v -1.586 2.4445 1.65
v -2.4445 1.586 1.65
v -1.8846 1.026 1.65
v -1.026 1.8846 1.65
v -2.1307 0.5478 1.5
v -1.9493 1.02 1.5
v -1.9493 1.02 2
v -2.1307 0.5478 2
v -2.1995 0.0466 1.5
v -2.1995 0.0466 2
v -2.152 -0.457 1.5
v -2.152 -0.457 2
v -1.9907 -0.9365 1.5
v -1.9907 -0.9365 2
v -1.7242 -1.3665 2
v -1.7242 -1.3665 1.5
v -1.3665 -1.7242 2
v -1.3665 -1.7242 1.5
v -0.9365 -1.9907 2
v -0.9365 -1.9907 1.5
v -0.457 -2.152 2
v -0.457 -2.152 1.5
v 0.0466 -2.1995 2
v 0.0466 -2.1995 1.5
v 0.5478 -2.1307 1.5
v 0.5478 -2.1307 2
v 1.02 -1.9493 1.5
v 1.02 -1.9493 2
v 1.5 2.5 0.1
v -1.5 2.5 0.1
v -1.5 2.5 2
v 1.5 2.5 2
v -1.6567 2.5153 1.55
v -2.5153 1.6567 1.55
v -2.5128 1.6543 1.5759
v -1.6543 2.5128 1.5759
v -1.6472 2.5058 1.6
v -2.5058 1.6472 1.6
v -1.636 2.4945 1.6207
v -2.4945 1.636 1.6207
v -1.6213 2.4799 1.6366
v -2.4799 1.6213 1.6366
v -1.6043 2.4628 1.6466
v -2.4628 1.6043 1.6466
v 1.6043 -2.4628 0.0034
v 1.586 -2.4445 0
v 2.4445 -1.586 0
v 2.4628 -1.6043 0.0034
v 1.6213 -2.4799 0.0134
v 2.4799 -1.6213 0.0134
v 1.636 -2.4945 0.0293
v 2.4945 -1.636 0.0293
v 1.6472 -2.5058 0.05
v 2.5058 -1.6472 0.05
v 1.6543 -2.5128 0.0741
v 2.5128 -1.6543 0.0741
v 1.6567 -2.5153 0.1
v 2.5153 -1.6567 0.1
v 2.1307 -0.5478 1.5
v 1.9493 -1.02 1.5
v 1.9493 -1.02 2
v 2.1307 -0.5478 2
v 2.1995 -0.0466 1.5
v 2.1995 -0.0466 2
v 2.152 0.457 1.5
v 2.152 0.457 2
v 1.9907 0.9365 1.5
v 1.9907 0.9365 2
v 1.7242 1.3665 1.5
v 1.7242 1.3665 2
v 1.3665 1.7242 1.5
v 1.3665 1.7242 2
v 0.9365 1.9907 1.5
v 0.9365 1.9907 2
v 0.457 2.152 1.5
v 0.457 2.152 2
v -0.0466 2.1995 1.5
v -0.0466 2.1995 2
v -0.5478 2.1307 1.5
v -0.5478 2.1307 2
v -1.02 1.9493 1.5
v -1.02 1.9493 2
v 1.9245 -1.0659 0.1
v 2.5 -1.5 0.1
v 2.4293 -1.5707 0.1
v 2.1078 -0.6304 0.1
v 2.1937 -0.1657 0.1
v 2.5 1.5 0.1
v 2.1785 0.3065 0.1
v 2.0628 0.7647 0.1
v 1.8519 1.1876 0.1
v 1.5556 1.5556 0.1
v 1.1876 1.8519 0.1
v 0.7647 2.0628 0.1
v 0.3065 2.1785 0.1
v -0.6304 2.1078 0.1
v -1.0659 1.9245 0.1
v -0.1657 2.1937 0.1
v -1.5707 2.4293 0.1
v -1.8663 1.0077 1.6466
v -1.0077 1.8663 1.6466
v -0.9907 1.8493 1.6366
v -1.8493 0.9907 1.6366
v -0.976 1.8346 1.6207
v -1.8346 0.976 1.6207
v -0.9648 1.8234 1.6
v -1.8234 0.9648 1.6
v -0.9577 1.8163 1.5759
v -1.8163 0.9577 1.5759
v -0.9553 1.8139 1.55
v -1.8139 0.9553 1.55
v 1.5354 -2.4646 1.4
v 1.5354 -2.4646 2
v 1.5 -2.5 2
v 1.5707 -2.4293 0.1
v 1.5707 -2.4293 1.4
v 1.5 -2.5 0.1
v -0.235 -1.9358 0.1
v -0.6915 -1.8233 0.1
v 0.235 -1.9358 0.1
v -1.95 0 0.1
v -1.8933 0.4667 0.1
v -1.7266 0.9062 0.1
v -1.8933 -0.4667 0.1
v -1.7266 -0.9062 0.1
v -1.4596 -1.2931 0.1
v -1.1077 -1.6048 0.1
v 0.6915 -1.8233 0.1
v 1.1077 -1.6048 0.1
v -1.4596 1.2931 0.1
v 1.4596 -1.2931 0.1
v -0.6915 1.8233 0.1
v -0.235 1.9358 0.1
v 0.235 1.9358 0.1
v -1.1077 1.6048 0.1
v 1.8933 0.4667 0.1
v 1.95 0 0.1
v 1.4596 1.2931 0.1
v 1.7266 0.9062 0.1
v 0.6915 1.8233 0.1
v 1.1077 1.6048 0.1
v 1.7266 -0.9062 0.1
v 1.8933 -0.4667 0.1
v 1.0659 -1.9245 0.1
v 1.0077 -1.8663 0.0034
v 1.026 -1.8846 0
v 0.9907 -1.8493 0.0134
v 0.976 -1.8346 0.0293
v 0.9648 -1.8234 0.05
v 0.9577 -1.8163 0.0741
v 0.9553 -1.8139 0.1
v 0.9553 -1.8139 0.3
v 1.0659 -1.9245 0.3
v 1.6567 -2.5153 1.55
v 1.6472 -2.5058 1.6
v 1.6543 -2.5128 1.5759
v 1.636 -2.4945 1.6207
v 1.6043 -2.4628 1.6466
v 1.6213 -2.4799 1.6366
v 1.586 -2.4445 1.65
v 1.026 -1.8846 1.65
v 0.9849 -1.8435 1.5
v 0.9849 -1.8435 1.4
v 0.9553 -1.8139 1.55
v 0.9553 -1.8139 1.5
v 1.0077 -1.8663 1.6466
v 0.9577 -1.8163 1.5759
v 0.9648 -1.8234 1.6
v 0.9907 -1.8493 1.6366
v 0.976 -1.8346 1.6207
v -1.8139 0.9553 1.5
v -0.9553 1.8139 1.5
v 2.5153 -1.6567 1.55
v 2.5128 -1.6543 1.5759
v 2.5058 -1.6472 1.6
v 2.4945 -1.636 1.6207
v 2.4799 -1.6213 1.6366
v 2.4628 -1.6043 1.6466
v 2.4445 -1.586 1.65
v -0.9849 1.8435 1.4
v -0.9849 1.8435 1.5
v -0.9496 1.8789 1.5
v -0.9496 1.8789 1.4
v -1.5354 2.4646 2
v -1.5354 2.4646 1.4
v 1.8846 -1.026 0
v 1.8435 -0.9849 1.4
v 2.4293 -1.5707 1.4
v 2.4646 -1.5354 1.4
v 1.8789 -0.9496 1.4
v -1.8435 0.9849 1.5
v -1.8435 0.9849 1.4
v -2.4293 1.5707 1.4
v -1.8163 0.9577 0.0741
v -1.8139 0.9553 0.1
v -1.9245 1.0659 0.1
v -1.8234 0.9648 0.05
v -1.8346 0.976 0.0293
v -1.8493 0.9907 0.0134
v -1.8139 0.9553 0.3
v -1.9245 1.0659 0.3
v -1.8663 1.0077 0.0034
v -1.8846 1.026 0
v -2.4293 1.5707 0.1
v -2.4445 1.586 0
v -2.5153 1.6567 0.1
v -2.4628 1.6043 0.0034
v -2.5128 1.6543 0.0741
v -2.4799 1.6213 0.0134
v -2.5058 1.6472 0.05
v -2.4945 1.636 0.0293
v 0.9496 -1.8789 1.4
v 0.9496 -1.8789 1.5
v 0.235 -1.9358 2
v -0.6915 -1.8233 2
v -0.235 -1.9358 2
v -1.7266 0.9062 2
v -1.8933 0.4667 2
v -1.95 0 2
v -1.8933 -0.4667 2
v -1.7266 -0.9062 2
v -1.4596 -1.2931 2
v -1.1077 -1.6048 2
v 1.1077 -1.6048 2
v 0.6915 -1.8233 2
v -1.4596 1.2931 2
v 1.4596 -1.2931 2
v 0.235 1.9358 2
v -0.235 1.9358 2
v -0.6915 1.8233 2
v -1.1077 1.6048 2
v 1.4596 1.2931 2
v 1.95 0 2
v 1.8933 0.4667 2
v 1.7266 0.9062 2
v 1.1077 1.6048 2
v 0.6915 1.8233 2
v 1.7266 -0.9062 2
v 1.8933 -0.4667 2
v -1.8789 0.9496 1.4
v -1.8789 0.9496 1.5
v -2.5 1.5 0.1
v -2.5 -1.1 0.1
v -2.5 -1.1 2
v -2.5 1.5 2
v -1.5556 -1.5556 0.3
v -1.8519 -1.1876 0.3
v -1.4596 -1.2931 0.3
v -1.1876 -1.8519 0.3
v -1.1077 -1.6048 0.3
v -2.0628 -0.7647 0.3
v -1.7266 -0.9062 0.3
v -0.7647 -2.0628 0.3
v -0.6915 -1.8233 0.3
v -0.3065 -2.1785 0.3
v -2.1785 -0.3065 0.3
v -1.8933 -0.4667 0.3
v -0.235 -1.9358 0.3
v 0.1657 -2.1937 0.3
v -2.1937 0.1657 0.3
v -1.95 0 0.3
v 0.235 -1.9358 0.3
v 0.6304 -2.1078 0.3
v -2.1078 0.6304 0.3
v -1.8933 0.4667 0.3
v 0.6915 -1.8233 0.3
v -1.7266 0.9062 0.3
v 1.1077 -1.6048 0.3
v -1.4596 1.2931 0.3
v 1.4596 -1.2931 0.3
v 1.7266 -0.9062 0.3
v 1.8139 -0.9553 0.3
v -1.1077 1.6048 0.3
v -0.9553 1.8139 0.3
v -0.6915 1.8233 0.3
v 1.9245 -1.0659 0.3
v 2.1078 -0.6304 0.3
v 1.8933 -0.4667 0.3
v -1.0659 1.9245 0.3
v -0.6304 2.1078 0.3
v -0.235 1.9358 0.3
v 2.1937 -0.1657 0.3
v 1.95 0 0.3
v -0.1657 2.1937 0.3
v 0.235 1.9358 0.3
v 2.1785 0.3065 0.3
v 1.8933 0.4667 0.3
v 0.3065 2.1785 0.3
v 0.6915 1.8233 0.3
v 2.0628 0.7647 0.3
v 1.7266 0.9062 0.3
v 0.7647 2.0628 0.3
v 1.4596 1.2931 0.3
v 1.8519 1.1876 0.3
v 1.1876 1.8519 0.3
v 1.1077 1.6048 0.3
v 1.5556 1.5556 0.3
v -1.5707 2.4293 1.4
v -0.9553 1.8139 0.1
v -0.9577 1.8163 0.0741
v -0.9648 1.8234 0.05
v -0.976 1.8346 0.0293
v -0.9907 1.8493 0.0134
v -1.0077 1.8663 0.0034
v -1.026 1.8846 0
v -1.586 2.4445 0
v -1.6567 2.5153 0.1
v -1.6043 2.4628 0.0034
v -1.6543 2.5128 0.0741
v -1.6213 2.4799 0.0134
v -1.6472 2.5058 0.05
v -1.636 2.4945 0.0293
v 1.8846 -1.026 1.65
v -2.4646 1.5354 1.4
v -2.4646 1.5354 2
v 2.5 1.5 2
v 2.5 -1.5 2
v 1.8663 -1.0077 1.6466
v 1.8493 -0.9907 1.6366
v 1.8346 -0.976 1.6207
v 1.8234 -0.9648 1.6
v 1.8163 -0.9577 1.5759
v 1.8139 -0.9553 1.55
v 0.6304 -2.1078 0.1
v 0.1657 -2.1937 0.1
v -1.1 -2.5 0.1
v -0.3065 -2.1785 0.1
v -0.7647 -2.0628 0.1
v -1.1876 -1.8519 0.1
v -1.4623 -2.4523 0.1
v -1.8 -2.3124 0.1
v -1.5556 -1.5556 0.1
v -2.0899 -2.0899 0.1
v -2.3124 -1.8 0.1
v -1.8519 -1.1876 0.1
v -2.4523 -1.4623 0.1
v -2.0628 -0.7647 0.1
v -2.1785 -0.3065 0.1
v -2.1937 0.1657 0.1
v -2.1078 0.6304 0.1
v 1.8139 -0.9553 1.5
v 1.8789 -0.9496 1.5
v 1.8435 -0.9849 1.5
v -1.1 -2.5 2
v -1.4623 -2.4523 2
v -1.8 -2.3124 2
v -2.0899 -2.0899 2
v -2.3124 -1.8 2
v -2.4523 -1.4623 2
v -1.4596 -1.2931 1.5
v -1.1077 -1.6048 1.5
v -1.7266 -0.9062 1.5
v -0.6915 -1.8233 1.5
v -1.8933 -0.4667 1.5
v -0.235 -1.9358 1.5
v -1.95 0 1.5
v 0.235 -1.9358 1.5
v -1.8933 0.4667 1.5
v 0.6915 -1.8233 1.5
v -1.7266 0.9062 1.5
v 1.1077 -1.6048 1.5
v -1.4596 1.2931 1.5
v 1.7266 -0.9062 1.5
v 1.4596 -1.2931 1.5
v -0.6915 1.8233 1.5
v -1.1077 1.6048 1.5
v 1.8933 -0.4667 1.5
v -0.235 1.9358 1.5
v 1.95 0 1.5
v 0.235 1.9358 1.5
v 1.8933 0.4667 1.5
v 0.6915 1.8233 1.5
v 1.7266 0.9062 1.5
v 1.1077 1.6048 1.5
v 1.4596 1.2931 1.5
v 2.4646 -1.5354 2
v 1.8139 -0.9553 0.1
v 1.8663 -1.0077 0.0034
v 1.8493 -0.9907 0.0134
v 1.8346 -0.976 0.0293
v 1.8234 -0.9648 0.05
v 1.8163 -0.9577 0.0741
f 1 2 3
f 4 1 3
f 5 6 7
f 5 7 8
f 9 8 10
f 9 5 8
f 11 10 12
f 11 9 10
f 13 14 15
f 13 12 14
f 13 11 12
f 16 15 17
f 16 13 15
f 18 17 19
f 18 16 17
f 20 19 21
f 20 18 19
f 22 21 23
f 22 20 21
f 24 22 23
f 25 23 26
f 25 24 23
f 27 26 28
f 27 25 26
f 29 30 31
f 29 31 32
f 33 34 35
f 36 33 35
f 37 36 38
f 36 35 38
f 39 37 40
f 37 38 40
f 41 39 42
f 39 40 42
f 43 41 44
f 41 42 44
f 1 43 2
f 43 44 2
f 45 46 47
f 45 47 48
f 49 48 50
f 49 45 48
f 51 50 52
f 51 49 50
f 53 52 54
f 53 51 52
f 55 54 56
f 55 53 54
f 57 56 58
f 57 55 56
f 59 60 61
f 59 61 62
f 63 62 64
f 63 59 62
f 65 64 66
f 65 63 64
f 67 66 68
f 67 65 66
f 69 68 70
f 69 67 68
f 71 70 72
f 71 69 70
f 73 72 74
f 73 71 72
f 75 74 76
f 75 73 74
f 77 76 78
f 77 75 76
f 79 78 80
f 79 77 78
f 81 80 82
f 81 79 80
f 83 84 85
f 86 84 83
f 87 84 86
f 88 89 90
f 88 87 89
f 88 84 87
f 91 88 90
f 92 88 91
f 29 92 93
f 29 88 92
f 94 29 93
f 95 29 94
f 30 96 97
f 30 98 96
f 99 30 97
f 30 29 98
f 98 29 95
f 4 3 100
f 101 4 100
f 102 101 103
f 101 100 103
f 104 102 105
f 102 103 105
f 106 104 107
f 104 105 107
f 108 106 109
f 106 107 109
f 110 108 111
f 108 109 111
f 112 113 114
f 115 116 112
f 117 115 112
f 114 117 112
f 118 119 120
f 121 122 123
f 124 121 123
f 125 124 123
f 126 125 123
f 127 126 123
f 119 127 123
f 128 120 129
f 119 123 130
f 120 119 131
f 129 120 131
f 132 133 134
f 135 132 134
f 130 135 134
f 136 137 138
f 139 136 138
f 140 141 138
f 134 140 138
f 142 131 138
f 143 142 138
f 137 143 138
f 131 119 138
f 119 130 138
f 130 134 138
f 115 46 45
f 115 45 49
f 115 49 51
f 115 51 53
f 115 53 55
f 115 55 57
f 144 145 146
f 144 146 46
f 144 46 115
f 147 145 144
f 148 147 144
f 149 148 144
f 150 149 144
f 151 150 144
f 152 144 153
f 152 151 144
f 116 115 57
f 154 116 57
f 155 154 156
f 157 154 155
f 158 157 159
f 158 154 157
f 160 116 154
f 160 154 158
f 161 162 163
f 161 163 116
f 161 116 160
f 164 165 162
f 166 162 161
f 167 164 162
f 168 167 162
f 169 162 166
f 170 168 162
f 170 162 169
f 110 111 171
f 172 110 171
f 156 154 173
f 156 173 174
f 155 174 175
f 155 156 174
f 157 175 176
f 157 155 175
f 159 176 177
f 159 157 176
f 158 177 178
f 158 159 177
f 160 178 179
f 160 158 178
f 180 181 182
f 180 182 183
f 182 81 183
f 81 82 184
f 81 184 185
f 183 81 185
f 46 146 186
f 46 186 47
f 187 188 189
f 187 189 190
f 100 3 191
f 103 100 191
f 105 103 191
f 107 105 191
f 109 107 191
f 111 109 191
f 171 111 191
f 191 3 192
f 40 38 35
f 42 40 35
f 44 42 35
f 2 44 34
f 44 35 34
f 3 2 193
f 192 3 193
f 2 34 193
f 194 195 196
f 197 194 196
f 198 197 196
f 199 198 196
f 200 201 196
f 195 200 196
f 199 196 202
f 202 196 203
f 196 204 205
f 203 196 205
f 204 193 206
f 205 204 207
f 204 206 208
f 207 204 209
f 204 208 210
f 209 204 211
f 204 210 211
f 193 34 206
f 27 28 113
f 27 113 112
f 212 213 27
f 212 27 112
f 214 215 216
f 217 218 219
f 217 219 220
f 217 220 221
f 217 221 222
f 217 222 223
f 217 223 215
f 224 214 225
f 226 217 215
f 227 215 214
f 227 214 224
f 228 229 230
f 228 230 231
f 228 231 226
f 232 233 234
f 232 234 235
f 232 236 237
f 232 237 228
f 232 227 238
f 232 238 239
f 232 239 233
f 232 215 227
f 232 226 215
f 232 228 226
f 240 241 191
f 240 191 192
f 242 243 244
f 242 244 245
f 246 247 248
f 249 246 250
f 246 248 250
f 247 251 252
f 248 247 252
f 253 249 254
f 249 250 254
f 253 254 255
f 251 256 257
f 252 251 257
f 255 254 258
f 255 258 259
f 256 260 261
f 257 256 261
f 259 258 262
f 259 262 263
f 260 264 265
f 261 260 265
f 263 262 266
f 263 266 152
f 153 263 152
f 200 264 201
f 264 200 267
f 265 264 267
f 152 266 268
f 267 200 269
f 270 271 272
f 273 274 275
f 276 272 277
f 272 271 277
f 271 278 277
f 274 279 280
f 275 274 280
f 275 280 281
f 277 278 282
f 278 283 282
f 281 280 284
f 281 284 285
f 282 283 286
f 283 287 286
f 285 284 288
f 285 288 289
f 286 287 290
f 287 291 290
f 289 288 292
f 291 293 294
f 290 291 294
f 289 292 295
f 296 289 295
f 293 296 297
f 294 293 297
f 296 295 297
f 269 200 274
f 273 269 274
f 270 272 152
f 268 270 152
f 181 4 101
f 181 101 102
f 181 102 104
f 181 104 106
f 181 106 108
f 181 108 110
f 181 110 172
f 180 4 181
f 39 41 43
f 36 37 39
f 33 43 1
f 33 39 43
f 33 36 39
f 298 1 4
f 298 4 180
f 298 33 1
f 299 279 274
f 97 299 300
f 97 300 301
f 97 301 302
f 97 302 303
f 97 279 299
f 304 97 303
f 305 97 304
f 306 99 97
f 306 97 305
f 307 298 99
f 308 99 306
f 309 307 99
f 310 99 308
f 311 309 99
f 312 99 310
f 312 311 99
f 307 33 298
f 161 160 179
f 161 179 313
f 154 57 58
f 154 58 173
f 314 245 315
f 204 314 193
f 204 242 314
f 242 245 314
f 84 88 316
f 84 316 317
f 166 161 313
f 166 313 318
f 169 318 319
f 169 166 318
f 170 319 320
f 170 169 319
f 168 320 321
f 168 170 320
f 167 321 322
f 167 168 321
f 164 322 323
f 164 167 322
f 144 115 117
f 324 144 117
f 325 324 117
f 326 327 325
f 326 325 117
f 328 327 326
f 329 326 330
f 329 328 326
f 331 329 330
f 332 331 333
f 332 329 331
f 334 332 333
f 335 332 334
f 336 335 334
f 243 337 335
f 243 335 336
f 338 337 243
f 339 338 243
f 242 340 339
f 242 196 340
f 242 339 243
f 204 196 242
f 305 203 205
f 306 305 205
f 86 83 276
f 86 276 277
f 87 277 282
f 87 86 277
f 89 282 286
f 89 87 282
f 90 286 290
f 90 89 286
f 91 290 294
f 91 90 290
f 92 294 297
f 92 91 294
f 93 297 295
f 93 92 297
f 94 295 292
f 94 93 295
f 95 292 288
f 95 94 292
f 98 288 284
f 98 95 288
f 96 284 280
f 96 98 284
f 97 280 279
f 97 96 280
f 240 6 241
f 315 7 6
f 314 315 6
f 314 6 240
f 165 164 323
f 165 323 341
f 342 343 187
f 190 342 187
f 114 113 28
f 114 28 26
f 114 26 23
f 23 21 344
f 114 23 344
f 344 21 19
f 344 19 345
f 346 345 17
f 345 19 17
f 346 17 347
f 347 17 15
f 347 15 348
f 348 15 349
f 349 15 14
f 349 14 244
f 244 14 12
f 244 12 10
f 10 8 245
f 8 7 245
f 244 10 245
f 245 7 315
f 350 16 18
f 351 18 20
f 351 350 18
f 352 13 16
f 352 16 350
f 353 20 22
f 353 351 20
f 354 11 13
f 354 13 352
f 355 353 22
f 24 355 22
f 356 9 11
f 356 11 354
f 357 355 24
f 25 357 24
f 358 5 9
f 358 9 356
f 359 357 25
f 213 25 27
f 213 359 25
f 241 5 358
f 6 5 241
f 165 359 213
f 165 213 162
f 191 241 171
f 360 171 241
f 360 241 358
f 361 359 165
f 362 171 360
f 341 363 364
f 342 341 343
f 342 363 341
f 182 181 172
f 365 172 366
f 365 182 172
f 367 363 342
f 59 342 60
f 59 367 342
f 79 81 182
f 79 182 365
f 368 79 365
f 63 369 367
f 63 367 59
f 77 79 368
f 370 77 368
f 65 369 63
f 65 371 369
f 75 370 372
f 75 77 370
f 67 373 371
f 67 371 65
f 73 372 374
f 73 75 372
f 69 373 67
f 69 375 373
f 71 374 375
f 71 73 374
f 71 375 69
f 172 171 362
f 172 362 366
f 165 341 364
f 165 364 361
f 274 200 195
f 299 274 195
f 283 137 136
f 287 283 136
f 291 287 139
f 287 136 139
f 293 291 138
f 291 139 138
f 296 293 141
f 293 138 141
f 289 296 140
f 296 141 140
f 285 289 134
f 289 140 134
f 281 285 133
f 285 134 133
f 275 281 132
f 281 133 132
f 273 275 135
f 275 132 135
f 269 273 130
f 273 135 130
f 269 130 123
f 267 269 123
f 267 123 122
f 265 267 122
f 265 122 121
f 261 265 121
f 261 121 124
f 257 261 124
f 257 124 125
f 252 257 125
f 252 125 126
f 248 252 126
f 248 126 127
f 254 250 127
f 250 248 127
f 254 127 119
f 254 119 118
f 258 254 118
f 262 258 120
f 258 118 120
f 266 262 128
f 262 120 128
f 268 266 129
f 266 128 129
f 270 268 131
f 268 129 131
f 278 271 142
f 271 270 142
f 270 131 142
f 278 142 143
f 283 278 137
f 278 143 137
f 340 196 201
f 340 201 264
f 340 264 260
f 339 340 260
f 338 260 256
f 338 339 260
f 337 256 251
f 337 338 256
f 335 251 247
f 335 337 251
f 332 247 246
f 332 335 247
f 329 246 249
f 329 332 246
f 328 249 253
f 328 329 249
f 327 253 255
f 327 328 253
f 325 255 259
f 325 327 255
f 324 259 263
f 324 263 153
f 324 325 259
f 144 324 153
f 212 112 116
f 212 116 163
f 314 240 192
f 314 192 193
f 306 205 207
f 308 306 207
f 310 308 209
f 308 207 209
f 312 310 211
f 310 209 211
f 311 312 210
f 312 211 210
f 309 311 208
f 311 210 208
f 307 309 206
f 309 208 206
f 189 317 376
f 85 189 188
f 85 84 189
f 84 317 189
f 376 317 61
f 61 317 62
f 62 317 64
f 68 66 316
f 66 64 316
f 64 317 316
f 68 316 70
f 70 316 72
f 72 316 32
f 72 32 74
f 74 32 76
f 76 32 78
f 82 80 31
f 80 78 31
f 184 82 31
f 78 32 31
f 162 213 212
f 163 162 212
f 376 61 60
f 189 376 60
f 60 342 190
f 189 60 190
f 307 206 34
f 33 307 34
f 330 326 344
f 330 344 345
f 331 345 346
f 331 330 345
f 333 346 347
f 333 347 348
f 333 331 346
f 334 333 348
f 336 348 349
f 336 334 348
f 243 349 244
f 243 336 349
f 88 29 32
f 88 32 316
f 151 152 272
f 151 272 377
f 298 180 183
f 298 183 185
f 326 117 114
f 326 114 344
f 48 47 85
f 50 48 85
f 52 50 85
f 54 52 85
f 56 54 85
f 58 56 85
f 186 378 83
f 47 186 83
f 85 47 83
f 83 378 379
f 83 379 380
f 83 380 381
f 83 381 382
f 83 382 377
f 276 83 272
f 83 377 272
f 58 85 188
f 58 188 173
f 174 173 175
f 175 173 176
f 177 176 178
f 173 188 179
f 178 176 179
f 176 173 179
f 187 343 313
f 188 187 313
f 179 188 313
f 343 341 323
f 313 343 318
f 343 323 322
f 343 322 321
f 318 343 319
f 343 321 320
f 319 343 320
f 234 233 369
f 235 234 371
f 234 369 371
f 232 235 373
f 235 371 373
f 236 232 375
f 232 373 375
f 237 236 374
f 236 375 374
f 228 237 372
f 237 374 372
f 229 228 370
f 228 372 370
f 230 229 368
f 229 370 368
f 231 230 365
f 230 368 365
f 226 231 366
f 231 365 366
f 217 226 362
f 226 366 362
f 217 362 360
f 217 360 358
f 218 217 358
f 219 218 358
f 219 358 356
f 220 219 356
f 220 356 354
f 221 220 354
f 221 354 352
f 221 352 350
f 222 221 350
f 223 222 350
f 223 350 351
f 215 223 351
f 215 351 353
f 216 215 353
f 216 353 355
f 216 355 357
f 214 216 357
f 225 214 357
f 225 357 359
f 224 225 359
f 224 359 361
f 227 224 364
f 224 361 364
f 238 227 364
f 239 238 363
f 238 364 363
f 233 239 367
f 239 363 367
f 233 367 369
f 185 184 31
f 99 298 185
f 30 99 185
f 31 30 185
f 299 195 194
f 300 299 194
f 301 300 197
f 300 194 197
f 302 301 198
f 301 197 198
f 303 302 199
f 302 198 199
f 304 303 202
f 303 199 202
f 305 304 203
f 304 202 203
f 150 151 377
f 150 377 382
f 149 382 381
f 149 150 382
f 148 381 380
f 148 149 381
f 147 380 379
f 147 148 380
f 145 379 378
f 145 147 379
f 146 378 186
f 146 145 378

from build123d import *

# Parameters (mm, degrees)
EXTRUDE_START        = 0.1
EXTRUDE_1_DEPTH      = 1.9
SKETCH_6_R           = 2.2
CUT_EXTRUDE_5_DEPTH  = 0.3
SKETCH_8_R           = 1.95
EXTRUDE_9_DEPTH      = 0.25
CUT_EXTRUDE_START    = 1.5
SKETCH_6_3_R         = 2.2
CUT_EXTRUDE_12_DEPTH = 0.6
CUT_EXTRUDE_START_2  = 0.05
SKETCH_12_W          = 0.65
SKETCH_12_H          = 0.899236211
CUT_EXTRUDE_15_DEPTH = 1.314213562
EXTRUDE_START_2      = 1.3
SKETCH_8_3_R         = 1.95
EXTRUDE_16_DEPTH     = 0.7
EXTRUDE_17_DEPTH     = 1.214213562


with BuildPart() as part:
    # Эскиз2 → Вытянуть1 (new body)
    with BuildSketch(Plane.XY.offset(EXTRUDE_START)):
        with BuildLine():
            Line((-1.5, 2.5), (1.5, 2.5))
            Line((1.5, 2.5), (2.5, 1.5))
            Line((2.5, 1.5), (2.5, -1.5))
            Line((2.5, -1.5), (1.5, -2.5))
            Line((1.5, -2.5), (-1.1, -2.5))
            ThreePointArc((-1.1, -2.5), (-2.089949494, -2.089949494), (-2.5, -1.1))
            Line((-2.5, -1.1), (-2.5, 1.5))
            Line((-2.5, 1.5), (-1.5, 2.5))
        make_face()
    extrude(amount=EXTRUDE_1_DEPTH)

    # Эскиз6 → Вытянуть5 (cut)
    with BuildSketch(Plane.XY):
        Circle(SKETCH_6_R)
    extrude(amount=CUT_EXTRUDE_5_DEPTH, mode=Mode.SUBTRACT)

    # Эскиз8 → Вытянуть9 (add)
    with BuildSketch(Plane.XY.offset(EXTRUDE_START)):
        Circle(SKETCH_8_R)
    extrude(amount=EXTRUDE_9_DEPTH)

    # Эскиз6<3> → Вытянуть12 (cut)
    with BuildSketch(Plane.XY.offset(CUT_EXTRUDE_START)):
        Circle(SKETCH_6_3_R)
    extrude(amount=CUT_EXTRUDE_12_DEPTH, mode=Mode.SUBTRACT)

    # Эскиз12 → Вытянуть15 (cut)
    with BuildSketch(Plane(origin=(-0.5, -0.5, 0), x_dir=(0, 0, -1), z_dir=(0.7071067811865499, 0.7071067811865452, 0)).offset(CUT_EXTRUDE_START_2)):
        with Locations((-1.725, 2.449618105)):
            Rectangle(SKETCH_12_W, SKETCH_12_H)
        with Locations((-1.725, -2.449618105)):
            Rectangle(SKETCH_12_W, SKETCH_12_H)
    extrude(amount=CUT_EXTRUDE_15_DEPTH, mode=Mode.SUBTRACT)

    # Эскиз8<3> → Вытянуть16 (add)
    with BuildSketch(Plane.XY.offset(EXTRUDE_START_2)):
        Circle(SKETCH_8_3_R)
    extrude(amount=EXTRUDE_16_DEPTH)

    # Эскиз10 → Вытянуть17 (add)
    with BuildSketch(Plane(origin=(-0.5, -0.5, 0), x_dir=(0, 0, -1), z_dir=(0.7071067811865499, 0.7071067811865452, 0)).offset(EXTRUDE_START)):
        with BuildLine():
            Line((0, 2.058150417), (0, 2.85))
            ThreePointArc((0, 2.85), (-0.029289322, 2.920710678), (-0.1, 2.95))
            Line((-0.1, 2.95), (-1.55, 2.95))
            ThreePointArc((-1.55, 2.95), (-1.620710678, 2.920710678), (-1.65, 2.85))
            Line((-1.65, 2.85), (-1.65, 2.058150417))
            ThreePointArc((-1.65, 2.058150417), (-1.620710678, 1.987439739), (-1.55, 1.958150417))
            Line((-1.55, 1.958150417), (-0.1, 1.958150417))
            ThreePointArc((-0.1, 1.958150417), (-0.029289322, 1.987439739), (0, 2.058150417))
        make_face()
        with BuildLine():
            Line((-1.55, -1.958150417), (-0.1, -1.958150417))
            ThreePointArc((-0.1, -1.958150417), (-0.029289322, -1.987439739), (0, -2.058150417))
            Line((0, -2.058150417), (0, -2.85))
            ThreePointArc((0, -2.85), (-0.029289322, -2.920710678), (-0.1, -2.95))
            Line((-0.1, -2.95), (-1.55, -2.95))
            ThreePointArc((-1.55, -2.95), (-1.620710678, -2.920710678), (-1.65, -2.85))
            Line((-1.65, -2.85), (-1.65, -2.058150417))
            ThreePointArc((-1.65, -2.058150417), (-1.620710678, -1.987439739), (-1.55, -1.958150417))
        make_face()
    extrude(amount=EXTRUDE_17_DEPTH)


solid = part.part
